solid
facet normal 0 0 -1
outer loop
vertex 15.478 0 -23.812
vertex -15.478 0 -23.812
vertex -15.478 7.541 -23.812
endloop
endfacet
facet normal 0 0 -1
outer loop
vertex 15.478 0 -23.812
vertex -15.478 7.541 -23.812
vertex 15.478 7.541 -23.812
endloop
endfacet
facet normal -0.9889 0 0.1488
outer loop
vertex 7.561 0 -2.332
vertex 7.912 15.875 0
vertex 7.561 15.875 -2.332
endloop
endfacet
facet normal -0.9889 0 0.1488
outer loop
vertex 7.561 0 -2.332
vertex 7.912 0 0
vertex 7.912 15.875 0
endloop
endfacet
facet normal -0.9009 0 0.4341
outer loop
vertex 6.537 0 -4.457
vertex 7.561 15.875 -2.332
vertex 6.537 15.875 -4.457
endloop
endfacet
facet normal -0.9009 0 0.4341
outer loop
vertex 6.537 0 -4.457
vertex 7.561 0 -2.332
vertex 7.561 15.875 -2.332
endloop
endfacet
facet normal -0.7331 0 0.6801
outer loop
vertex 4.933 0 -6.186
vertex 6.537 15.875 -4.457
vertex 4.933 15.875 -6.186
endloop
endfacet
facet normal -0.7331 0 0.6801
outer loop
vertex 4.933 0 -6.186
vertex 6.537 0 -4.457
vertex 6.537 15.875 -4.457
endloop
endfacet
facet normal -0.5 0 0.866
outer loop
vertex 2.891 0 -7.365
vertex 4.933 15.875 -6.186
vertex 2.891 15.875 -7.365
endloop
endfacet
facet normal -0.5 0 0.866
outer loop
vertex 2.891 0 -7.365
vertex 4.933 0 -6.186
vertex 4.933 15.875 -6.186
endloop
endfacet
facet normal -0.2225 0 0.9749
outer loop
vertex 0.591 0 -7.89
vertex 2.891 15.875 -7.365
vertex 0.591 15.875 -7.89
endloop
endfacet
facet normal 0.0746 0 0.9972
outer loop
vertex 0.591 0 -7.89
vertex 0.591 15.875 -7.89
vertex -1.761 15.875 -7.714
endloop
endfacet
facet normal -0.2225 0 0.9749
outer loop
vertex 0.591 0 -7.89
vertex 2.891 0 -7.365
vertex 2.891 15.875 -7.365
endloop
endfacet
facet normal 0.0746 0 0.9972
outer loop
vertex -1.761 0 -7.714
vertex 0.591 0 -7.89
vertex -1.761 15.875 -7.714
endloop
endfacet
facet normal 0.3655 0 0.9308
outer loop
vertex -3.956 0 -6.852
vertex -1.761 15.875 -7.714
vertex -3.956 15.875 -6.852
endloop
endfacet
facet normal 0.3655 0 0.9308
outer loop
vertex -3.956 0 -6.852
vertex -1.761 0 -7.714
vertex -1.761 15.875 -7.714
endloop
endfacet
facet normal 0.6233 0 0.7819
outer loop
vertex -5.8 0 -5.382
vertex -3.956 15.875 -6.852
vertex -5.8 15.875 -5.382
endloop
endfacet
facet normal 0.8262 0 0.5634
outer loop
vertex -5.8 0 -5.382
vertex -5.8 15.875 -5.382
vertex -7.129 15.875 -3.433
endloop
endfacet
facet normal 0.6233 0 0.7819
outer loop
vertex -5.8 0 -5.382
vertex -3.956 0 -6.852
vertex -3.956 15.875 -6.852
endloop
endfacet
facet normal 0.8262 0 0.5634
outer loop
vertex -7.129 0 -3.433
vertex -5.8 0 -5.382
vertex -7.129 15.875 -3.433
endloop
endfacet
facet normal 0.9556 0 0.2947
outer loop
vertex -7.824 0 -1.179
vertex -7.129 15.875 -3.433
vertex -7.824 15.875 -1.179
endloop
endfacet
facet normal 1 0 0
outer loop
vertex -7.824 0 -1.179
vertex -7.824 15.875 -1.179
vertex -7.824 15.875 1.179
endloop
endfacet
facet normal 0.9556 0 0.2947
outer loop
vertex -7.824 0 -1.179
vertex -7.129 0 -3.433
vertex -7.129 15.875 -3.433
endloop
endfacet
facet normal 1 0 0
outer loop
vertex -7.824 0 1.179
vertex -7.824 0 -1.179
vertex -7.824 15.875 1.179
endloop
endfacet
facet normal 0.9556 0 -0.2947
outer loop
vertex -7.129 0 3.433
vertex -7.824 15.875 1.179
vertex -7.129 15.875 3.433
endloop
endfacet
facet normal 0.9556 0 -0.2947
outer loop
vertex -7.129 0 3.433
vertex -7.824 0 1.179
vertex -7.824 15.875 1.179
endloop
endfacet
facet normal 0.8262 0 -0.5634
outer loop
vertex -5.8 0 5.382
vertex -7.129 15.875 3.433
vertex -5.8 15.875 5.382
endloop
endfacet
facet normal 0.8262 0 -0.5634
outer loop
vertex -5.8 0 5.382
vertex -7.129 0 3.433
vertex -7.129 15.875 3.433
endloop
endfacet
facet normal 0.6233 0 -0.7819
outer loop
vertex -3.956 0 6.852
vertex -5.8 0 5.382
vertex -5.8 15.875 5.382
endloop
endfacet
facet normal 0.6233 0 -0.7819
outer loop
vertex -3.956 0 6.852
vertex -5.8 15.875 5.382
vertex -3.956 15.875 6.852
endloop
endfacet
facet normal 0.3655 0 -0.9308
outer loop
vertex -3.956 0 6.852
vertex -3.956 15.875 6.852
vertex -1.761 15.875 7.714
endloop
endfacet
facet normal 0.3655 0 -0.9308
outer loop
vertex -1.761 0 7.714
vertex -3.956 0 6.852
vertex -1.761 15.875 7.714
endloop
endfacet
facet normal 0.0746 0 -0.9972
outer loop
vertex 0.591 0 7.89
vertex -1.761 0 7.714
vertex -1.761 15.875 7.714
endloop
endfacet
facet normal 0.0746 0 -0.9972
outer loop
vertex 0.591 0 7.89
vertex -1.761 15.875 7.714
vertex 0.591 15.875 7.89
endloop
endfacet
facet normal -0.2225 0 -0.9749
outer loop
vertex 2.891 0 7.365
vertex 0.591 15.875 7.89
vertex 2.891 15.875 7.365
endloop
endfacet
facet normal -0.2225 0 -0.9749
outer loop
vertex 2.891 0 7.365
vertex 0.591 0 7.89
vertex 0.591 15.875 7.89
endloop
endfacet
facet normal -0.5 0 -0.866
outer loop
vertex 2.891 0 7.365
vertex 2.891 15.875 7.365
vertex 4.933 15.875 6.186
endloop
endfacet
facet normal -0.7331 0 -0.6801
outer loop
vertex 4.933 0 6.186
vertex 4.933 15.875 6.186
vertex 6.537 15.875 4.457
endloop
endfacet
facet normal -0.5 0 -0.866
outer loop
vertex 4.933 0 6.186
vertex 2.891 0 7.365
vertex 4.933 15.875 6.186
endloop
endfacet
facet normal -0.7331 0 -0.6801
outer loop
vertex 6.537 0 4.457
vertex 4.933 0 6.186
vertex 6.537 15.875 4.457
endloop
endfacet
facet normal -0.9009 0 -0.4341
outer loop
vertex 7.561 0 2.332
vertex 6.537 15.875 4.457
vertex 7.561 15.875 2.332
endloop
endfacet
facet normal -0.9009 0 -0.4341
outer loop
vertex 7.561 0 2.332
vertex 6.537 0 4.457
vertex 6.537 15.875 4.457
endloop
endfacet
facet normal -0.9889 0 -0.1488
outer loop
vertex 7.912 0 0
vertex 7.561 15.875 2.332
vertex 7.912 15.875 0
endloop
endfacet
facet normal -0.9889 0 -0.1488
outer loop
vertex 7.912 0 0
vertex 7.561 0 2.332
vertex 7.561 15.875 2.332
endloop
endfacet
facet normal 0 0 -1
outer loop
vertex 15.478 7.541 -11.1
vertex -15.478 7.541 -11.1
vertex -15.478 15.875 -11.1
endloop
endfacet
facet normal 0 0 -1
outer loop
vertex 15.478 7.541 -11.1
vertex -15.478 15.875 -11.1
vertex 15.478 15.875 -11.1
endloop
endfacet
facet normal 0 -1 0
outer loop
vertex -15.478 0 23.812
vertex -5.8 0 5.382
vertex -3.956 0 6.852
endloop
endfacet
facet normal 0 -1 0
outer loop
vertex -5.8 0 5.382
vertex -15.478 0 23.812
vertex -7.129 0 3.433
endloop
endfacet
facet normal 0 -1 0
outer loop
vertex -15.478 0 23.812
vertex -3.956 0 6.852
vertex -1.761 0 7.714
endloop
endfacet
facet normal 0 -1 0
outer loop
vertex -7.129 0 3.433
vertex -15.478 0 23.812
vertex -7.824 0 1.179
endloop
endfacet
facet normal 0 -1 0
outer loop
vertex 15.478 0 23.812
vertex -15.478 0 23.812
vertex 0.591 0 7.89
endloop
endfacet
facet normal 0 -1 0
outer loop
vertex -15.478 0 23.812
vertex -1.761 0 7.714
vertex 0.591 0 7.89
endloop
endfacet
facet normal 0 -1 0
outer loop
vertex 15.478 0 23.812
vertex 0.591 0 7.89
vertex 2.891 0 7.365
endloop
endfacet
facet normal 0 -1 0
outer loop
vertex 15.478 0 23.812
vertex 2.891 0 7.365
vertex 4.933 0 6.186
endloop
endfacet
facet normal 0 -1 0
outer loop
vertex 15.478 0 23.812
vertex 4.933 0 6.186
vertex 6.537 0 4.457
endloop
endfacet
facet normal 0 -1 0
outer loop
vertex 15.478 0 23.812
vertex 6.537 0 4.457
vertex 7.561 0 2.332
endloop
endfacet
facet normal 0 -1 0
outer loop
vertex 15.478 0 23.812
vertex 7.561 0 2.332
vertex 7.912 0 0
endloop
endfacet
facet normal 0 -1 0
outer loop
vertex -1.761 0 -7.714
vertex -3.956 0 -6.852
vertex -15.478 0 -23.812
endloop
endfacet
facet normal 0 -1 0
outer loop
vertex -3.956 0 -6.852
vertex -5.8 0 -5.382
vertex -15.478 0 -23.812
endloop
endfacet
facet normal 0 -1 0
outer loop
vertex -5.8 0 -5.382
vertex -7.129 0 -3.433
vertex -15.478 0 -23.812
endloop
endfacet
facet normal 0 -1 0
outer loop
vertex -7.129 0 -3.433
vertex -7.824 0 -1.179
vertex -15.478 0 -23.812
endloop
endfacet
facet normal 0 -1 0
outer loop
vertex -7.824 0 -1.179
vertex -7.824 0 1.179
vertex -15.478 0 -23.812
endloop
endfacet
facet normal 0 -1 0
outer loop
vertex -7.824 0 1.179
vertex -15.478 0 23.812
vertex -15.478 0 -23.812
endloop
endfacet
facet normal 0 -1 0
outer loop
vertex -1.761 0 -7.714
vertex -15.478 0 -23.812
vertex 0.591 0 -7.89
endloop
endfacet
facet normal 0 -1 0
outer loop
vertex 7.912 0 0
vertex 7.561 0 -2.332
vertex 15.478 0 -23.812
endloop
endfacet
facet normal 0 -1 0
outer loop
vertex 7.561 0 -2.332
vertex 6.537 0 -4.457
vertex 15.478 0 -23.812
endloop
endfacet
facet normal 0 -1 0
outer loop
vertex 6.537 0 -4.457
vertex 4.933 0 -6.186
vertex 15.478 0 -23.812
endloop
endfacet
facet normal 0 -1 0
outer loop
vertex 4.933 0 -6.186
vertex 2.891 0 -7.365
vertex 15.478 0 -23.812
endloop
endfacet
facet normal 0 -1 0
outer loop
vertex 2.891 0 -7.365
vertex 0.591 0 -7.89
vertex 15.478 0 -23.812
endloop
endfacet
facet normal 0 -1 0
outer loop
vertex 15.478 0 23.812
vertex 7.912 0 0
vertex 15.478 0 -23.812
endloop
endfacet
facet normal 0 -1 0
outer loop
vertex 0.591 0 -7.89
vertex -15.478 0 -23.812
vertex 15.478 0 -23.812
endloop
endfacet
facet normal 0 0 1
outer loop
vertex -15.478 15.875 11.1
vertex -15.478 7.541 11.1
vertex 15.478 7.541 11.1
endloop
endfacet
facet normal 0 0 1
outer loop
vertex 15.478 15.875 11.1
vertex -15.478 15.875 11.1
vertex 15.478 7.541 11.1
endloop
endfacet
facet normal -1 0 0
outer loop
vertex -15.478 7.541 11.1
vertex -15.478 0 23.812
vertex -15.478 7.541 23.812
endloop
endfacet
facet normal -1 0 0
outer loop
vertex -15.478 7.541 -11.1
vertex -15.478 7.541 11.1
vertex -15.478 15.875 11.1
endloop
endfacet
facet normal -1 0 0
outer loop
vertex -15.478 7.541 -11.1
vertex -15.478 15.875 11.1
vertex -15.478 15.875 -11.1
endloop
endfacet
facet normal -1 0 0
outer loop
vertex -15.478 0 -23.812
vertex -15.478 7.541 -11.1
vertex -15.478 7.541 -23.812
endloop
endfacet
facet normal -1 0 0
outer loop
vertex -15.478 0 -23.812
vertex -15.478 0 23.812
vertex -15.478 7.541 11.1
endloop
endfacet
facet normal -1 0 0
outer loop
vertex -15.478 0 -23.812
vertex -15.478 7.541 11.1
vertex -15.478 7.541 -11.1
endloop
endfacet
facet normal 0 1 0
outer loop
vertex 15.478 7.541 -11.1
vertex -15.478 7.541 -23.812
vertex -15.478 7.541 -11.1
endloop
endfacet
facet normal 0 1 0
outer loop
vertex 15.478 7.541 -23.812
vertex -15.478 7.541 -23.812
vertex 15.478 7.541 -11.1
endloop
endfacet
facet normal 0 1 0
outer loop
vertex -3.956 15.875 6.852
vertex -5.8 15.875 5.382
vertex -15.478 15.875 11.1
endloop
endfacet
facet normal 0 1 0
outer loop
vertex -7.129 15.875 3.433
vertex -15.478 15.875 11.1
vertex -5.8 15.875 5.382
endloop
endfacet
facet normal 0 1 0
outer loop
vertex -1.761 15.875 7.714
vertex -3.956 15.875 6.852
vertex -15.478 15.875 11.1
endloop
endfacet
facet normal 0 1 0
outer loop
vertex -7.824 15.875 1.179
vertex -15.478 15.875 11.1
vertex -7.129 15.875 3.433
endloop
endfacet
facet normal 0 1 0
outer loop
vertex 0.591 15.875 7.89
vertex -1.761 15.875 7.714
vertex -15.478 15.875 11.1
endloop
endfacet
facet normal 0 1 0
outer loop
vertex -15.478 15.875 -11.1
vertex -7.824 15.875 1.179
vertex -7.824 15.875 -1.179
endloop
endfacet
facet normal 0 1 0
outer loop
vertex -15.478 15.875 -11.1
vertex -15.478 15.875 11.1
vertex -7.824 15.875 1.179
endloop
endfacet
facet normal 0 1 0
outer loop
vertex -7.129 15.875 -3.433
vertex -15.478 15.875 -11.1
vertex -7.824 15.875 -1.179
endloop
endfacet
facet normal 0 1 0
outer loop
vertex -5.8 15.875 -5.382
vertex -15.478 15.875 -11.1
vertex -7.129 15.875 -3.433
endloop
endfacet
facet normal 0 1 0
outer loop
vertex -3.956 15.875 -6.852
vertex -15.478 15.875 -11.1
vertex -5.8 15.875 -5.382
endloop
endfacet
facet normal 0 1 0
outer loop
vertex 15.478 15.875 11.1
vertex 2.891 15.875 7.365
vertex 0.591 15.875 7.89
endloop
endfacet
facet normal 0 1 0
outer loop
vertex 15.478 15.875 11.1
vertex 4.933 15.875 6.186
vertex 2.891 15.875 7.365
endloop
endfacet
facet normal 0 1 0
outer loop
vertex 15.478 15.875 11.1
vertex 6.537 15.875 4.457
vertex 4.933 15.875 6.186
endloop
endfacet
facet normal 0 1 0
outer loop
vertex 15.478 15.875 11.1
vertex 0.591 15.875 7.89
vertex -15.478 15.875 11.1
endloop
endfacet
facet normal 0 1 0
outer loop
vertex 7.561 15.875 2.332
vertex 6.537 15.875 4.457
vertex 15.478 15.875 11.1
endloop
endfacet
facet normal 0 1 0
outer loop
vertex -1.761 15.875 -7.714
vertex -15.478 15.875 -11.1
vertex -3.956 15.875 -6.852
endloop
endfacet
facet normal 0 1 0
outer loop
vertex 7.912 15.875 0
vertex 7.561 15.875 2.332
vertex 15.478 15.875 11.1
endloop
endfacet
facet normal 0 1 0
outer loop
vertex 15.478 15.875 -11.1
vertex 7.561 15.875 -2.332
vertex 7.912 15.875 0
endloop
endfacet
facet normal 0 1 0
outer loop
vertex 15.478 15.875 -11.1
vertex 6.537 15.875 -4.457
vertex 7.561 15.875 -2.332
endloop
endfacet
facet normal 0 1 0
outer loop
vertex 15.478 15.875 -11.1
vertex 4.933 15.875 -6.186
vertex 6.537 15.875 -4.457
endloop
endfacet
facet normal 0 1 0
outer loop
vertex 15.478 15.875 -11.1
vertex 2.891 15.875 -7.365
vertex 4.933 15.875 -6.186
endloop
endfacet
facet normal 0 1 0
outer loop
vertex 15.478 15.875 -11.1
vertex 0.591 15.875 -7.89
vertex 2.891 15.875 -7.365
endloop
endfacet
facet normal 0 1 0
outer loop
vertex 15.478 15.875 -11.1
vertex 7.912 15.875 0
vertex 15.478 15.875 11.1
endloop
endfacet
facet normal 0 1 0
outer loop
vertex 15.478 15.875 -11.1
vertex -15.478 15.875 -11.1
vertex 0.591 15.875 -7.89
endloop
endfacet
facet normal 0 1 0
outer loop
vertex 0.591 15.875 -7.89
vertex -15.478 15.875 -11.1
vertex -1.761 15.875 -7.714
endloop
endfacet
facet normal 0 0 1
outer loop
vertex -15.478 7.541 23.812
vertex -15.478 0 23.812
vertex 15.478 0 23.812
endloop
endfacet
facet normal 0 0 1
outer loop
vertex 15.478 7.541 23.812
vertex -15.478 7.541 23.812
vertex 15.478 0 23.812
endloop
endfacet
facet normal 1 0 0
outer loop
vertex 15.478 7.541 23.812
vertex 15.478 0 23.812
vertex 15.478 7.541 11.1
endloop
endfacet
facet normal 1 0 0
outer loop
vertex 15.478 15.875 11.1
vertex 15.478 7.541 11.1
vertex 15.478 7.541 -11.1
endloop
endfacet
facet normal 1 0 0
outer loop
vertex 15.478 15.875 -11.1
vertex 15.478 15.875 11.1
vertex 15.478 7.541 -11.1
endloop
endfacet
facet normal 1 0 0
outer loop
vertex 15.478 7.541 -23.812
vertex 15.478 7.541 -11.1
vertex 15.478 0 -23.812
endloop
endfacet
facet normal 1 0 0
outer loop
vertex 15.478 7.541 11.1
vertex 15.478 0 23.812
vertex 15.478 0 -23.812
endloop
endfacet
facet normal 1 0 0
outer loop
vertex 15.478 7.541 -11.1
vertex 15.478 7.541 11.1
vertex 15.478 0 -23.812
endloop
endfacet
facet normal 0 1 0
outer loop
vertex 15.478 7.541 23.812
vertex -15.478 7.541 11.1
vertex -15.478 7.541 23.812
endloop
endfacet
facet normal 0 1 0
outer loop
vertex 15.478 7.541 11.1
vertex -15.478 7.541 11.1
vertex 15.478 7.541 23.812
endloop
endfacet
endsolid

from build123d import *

# Parameters (mm, degrees)
SKETCH1_W           = 30.95625
SKETCH1_H           = 47.625
SKETCH1_R           = 7.9121
BOSS_EXTRUDE1_DEPTH = 7.540625
SKETCH2_W           = 30.95625
SKETCH2_H           = 22.1996
SKETCH2_R           = 7.9121
BOSS_EXTRUDE2_DEPTH = 8.334375


with BuildPart() as part:
    # Sketch1 → Boss-Extrude1 (new body)
    with BuildSketch(Plane(origin=(0, 0, 0), x_dir=(1, 0, 0), z_dir=(0, 1, 0))):
        Rectangle(SKETCH1_W, SKETCH1_H)
        Circle(SKETCH1_R, mode=Mode.SUBTRACT)
    extrude(amount=BOSS_EXTRUDE1_DEPTH)

    # Sketch2 → Boss-Extrude2 (add)
    with BuildSketch(Plane(origin=(0, 7.540625, 0), x_dir=(1, 0, 0), z_dir=(0, 1, 0))):
        Rectangle(SKETCH2_W, SKETCH2_H)
        Circle(SKETCH2_R, mode=Mode.SUBTRACT)
    extrude(amount=BOSS_EXTRUDE2_DEPTH)


solid = part.part
